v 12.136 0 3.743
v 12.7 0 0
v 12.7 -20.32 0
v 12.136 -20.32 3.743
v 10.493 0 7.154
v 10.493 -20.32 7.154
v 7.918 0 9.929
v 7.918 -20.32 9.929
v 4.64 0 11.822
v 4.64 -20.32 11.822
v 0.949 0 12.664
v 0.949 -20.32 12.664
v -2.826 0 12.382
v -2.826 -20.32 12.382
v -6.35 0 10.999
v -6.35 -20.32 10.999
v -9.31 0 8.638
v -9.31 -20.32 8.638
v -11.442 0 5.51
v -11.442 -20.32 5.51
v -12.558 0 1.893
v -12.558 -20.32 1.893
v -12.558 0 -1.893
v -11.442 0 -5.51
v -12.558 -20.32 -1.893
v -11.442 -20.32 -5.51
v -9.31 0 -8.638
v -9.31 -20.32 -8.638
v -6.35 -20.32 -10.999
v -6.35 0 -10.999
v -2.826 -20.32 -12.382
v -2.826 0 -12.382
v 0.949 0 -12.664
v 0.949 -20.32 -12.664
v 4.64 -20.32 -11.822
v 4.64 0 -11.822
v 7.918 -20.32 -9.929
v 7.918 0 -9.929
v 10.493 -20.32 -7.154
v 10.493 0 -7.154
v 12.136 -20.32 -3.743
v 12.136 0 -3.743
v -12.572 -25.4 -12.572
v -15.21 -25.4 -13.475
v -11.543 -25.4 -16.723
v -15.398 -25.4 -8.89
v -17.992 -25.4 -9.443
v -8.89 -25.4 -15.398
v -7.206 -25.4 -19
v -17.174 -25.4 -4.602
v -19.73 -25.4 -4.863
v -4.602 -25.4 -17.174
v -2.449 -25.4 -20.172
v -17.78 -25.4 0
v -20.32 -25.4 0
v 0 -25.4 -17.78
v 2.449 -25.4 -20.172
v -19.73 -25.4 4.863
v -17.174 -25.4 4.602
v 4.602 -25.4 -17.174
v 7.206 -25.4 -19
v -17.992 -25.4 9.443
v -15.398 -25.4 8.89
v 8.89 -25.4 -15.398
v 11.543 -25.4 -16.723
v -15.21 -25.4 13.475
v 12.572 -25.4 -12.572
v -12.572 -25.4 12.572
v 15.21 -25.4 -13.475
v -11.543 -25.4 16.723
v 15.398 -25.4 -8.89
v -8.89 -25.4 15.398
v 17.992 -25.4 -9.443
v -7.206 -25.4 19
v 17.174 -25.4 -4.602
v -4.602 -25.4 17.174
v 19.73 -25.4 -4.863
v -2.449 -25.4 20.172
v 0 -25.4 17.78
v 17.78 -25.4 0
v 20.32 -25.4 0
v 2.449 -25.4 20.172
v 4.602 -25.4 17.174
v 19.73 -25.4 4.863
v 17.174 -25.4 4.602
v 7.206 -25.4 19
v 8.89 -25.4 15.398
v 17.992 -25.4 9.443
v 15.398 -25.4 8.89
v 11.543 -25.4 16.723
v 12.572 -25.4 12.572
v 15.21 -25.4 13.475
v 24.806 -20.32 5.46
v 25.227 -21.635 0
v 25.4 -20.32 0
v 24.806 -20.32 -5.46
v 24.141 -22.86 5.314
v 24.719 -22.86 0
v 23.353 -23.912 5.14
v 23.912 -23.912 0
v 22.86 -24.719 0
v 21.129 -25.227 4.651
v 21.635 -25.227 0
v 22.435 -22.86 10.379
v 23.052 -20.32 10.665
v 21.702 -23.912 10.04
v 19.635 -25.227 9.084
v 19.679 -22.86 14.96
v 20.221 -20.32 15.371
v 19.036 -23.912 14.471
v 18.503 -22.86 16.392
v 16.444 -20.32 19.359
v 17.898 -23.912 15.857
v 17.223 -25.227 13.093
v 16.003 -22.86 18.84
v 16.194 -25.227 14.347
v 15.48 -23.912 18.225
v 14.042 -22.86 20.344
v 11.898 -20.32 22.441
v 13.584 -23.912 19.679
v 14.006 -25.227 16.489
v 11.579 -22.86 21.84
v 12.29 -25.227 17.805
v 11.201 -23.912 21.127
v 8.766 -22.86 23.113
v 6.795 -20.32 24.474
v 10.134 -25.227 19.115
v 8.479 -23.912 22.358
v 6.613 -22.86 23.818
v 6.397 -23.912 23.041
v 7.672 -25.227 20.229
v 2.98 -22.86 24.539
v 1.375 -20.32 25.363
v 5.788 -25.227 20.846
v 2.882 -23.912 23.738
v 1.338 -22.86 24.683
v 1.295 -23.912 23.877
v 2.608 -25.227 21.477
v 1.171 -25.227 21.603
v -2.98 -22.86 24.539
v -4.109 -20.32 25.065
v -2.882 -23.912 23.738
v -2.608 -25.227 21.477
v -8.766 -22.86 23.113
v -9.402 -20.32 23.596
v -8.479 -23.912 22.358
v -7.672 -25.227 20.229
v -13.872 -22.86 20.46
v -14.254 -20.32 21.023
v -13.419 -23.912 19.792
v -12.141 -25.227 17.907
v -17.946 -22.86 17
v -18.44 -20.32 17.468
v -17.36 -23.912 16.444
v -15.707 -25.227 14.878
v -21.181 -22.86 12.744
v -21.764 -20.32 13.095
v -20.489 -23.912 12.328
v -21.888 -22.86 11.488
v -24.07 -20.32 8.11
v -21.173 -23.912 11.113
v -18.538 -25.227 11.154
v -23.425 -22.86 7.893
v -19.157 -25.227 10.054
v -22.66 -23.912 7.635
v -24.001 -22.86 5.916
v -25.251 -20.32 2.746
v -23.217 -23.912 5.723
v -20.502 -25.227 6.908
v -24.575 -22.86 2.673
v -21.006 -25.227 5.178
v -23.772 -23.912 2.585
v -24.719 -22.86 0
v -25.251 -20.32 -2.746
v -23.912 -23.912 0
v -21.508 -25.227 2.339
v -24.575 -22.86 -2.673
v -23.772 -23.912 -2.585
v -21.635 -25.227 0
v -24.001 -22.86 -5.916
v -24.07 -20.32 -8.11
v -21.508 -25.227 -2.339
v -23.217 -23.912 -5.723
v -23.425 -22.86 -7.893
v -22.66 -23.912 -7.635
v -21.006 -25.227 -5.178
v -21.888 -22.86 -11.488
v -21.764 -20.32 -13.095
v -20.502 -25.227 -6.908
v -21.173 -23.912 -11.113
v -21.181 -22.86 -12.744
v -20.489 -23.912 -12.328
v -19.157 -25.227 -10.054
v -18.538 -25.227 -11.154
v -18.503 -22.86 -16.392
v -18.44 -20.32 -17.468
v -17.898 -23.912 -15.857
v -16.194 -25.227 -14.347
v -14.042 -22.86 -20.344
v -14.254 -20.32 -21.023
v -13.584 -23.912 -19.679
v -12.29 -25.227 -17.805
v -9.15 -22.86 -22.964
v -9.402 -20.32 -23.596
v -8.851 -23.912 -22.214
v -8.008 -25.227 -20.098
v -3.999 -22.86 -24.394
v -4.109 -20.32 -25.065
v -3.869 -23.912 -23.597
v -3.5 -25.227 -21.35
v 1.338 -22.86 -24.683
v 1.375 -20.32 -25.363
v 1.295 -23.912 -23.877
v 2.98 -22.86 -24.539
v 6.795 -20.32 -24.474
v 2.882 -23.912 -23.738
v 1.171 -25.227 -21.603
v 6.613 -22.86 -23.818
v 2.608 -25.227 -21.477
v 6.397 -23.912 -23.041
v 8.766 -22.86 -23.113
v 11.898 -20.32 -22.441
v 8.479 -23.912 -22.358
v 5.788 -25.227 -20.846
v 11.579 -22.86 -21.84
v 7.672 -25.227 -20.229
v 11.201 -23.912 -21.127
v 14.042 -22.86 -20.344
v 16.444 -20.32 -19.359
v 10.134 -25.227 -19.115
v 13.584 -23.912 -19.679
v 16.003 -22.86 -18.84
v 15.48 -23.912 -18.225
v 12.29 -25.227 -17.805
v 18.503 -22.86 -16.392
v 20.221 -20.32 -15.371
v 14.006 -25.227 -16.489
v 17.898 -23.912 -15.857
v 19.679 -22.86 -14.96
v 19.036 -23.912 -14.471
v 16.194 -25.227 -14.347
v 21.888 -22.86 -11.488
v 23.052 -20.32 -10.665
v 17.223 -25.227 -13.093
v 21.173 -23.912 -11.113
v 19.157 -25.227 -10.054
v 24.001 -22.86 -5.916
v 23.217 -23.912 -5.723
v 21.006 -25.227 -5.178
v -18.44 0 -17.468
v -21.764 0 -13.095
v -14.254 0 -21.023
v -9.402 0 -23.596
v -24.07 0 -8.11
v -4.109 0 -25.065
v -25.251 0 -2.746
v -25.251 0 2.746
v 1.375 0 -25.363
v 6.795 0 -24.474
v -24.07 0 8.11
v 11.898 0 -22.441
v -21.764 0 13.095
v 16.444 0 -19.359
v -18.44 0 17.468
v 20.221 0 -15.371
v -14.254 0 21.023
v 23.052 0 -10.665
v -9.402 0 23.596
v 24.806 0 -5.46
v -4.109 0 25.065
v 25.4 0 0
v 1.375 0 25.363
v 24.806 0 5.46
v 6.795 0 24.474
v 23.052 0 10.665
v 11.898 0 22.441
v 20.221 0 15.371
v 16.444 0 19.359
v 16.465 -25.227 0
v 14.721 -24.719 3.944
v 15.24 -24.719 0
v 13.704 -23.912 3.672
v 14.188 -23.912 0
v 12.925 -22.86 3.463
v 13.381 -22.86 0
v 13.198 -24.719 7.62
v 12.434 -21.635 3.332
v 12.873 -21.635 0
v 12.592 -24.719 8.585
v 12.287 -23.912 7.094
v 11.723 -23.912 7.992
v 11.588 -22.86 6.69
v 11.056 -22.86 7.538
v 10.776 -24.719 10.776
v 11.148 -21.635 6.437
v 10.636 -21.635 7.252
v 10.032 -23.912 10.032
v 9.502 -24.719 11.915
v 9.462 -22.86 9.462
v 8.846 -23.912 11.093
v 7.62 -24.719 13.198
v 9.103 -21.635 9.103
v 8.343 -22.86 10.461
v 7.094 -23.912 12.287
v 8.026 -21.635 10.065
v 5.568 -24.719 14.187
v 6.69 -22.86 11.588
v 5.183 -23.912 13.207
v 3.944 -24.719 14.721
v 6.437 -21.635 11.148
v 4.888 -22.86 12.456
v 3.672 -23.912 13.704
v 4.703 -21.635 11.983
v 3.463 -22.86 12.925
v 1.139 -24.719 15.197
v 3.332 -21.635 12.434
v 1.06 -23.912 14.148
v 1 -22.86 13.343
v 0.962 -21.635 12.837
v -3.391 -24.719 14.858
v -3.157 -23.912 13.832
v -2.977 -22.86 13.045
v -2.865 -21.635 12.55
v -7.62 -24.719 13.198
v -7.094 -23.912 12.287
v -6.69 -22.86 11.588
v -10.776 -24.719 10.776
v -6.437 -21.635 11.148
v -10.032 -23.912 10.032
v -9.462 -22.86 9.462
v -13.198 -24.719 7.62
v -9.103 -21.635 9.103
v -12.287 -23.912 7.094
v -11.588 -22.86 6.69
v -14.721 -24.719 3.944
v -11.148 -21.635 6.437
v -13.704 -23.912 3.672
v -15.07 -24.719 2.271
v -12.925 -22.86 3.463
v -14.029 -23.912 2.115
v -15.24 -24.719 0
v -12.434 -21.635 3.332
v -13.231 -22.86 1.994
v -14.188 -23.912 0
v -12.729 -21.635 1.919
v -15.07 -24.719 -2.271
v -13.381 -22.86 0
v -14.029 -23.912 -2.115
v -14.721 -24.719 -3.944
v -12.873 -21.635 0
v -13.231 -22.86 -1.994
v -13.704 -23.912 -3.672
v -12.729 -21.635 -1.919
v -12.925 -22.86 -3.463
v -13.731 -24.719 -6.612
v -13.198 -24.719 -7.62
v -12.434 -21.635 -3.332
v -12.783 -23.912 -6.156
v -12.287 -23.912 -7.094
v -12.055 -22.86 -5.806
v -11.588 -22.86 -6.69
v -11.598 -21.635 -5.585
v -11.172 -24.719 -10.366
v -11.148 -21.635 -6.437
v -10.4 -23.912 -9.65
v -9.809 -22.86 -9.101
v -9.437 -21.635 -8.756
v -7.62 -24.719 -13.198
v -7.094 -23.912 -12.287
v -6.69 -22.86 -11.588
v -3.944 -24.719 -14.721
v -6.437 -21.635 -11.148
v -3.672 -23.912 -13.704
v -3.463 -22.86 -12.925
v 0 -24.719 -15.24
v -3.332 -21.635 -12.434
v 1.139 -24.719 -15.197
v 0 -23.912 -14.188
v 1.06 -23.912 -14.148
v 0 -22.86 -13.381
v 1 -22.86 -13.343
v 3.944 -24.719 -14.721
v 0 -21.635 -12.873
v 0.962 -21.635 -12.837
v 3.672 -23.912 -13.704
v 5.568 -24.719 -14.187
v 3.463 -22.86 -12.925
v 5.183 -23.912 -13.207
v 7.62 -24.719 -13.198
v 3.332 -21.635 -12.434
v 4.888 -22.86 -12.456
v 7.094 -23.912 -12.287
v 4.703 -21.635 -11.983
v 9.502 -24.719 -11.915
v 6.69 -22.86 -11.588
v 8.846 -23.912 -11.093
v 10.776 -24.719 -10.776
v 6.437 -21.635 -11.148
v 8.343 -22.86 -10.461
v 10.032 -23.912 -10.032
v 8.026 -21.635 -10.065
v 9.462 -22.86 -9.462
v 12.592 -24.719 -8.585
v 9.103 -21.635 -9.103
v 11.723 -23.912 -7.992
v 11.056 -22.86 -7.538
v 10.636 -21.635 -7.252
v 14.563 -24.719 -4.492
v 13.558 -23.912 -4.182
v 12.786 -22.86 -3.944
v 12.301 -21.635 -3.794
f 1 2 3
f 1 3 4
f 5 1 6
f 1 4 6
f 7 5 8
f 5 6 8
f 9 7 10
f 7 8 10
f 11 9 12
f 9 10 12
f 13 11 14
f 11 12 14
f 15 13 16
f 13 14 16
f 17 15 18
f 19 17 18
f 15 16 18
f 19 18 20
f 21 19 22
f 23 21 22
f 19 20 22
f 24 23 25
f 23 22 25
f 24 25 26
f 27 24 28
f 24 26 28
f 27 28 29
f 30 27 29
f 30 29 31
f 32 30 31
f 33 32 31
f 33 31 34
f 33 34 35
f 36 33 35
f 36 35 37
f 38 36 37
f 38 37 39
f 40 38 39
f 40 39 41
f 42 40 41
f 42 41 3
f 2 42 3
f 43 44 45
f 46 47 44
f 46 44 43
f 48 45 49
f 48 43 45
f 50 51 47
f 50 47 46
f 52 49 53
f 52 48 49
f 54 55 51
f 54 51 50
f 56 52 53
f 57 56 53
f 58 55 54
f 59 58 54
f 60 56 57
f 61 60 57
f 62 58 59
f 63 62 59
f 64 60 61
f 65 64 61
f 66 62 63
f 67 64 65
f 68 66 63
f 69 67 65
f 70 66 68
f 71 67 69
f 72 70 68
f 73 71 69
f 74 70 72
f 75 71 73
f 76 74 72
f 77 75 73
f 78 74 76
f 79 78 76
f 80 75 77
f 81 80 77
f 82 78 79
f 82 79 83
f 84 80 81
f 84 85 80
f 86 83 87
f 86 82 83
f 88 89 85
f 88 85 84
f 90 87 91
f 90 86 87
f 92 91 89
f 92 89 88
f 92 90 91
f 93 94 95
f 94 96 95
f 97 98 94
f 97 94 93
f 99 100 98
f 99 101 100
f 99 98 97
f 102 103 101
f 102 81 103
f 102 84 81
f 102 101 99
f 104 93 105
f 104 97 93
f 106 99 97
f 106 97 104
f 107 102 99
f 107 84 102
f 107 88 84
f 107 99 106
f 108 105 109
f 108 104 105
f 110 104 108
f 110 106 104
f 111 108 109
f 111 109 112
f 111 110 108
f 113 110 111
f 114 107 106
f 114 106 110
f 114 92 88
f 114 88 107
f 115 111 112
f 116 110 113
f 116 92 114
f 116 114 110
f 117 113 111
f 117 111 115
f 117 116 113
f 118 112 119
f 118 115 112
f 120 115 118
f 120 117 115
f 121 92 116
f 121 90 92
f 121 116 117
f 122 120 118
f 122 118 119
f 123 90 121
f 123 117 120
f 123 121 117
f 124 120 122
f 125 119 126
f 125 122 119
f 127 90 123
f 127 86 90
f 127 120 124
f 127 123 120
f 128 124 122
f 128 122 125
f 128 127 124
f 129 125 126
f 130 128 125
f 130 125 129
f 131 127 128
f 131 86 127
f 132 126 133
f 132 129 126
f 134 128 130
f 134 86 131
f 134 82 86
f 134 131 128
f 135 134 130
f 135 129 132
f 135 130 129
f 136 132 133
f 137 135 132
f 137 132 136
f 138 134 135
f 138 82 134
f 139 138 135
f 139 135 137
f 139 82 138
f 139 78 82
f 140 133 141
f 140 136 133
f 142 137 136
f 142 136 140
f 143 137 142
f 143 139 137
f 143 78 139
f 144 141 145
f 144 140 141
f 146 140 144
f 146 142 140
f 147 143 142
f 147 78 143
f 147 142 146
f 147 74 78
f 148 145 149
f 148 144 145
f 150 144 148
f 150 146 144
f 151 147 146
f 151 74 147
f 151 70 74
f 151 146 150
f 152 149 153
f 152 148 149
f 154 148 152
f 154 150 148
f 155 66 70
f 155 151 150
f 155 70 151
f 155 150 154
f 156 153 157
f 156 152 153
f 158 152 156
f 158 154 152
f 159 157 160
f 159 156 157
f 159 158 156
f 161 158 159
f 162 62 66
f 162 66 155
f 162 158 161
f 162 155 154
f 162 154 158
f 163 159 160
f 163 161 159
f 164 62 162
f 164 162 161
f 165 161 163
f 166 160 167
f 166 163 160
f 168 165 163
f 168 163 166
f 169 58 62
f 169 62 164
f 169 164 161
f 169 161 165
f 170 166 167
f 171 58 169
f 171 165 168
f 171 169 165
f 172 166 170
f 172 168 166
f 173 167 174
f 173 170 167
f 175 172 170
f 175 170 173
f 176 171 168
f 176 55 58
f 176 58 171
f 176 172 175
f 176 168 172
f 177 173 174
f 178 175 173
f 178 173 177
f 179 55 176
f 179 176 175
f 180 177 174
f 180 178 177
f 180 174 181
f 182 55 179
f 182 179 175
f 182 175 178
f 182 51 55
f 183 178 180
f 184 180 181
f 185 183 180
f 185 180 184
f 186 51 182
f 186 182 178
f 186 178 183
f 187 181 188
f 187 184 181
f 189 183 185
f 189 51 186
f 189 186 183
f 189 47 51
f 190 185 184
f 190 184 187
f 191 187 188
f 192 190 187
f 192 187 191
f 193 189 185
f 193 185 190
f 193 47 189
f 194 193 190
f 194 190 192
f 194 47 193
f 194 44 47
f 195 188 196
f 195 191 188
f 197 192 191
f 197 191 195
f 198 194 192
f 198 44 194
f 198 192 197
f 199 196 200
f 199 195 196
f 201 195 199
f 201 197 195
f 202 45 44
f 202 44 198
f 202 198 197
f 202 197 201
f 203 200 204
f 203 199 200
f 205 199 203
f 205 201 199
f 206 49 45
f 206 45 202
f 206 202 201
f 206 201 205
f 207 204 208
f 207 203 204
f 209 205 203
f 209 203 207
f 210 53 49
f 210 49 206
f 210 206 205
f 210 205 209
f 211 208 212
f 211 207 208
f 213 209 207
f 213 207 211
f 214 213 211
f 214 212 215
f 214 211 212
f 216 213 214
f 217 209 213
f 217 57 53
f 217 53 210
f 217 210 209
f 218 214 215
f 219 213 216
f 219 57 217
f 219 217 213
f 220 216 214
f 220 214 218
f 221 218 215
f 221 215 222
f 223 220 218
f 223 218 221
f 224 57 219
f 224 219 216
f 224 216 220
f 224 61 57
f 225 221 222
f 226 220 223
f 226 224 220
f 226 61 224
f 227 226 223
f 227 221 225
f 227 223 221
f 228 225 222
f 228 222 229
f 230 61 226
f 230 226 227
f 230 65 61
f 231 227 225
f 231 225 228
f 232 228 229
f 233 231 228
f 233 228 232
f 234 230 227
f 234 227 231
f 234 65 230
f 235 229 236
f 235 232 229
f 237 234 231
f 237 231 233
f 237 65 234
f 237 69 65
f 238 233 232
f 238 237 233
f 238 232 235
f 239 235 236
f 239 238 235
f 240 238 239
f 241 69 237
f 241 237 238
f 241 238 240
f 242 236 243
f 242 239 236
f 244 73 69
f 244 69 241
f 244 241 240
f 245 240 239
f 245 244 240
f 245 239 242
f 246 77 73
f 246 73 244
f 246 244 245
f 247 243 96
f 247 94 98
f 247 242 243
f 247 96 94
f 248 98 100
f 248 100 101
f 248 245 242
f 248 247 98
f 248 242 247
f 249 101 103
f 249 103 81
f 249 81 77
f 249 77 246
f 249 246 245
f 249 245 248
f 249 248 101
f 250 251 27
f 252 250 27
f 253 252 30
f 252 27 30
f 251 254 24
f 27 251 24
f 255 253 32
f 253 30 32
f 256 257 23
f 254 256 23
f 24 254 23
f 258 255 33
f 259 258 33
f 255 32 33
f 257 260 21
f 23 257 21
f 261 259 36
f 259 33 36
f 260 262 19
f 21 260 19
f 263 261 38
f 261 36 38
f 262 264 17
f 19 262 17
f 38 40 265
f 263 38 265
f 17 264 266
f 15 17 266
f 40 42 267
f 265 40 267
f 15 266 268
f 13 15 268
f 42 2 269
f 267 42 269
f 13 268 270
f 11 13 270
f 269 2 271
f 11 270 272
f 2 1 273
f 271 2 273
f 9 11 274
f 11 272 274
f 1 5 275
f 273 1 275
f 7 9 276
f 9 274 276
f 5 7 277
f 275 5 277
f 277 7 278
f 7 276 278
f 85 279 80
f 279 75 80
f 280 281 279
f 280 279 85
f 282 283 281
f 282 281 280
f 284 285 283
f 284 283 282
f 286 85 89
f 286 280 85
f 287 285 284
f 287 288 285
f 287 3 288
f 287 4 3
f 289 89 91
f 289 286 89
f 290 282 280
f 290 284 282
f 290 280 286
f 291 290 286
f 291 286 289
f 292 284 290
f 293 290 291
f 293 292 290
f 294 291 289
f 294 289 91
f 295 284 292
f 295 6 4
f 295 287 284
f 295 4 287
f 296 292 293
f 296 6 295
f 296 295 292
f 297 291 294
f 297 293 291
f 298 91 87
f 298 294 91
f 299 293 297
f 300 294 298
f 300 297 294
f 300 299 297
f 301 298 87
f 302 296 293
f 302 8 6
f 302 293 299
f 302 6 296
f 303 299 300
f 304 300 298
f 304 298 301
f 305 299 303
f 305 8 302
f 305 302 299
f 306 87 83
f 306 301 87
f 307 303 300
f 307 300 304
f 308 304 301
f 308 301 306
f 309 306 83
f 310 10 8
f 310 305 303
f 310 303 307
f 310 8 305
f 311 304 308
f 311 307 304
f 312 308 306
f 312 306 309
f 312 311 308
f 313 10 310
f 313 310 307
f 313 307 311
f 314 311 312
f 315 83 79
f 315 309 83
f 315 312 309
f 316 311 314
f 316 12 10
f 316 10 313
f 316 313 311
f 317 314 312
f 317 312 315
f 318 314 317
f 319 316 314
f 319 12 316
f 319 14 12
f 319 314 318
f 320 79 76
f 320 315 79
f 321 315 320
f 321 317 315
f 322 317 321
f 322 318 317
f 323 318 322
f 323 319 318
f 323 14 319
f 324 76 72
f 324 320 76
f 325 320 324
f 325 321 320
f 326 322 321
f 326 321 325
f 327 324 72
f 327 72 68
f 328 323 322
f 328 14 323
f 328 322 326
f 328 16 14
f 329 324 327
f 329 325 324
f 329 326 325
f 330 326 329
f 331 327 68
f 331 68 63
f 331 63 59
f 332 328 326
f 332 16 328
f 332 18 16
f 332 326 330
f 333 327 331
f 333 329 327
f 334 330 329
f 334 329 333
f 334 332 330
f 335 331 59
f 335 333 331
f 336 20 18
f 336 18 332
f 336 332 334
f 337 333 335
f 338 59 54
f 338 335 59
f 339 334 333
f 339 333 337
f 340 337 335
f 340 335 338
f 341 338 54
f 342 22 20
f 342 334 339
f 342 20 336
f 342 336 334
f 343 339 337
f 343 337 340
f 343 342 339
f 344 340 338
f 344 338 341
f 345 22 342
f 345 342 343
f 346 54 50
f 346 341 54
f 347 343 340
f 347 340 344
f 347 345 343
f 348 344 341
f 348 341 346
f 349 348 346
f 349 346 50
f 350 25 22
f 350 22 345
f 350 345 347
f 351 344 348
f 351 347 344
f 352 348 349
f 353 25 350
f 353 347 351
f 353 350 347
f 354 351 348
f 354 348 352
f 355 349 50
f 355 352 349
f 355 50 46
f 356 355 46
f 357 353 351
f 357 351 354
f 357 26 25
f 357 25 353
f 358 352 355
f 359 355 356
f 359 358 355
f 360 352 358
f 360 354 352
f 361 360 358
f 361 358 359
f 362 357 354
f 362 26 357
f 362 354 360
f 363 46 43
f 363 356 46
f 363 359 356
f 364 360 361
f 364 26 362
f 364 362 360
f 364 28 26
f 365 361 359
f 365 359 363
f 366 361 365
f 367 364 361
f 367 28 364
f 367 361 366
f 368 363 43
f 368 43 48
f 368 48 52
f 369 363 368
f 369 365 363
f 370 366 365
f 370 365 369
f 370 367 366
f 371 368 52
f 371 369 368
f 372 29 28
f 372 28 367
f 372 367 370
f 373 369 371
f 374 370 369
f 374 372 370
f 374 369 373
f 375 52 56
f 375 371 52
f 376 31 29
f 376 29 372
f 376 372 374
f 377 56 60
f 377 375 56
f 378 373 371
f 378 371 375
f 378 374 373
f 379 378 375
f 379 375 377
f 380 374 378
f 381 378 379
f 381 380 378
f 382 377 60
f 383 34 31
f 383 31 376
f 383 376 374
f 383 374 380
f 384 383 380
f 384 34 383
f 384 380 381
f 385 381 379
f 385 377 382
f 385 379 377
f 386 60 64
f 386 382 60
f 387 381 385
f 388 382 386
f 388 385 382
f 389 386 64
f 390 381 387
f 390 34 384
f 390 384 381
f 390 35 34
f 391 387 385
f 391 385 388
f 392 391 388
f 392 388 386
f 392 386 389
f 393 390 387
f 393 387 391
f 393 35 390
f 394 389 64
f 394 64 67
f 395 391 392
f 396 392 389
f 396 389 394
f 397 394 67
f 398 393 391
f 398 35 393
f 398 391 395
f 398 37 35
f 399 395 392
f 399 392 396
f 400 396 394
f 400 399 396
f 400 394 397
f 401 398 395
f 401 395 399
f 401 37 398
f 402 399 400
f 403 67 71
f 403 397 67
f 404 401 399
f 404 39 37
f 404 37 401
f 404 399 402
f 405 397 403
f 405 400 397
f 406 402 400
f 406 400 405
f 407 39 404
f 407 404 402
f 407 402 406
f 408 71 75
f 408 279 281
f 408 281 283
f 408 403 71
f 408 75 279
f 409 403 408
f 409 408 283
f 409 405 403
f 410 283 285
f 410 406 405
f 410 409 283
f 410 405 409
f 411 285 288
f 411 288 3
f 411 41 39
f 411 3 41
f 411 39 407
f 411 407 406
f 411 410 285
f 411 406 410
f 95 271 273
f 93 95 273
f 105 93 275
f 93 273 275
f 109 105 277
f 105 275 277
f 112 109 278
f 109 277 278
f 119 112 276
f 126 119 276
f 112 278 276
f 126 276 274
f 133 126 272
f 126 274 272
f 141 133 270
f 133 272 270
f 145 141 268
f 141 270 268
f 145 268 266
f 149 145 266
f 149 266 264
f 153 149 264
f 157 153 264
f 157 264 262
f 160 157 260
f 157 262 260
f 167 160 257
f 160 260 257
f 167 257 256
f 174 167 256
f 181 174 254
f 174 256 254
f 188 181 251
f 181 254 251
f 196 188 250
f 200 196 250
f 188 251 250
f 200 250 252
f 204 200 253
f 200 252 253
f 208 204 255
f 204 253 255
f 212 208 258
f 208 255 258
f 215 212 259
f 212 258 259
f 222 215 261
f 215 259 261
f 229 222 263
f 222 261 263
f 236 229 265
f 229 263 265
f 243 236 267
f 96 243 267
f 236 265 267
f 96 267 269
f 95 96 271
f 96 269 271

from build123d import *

# Parameters (mm, degrees)
F0_R     = 25.4
F1_DEPTH = 25.4
F2_R     = 12.7
F3_DEPTH = 25.401
F4_R     = 5.08


with BuildPart() as f1:
    # F0 (on Front) → F1 (new body)
    with BuildSketch(Plane.XZ):
        Circle(F0_R)
    extrude(amount=F1_DEPTH)

    # F2 (on face) → F3 (cut, through all)
    with BuildSketch(Plane.XZ.offset(25.4)):
        Circle(F2_R)
    extrude(amount=-F3_DEPTH, mode=Mode.SUBTRACT)

    # F4
    f4_edges = [f1.edges().sort_by_distance(p)[0] for p in [
        (-25.4, -25.4, 0),
        (-12.7, -25.4, 0),
    ]]
    fillet(f4_edges, radius=F4_R)


solid = f1.part
